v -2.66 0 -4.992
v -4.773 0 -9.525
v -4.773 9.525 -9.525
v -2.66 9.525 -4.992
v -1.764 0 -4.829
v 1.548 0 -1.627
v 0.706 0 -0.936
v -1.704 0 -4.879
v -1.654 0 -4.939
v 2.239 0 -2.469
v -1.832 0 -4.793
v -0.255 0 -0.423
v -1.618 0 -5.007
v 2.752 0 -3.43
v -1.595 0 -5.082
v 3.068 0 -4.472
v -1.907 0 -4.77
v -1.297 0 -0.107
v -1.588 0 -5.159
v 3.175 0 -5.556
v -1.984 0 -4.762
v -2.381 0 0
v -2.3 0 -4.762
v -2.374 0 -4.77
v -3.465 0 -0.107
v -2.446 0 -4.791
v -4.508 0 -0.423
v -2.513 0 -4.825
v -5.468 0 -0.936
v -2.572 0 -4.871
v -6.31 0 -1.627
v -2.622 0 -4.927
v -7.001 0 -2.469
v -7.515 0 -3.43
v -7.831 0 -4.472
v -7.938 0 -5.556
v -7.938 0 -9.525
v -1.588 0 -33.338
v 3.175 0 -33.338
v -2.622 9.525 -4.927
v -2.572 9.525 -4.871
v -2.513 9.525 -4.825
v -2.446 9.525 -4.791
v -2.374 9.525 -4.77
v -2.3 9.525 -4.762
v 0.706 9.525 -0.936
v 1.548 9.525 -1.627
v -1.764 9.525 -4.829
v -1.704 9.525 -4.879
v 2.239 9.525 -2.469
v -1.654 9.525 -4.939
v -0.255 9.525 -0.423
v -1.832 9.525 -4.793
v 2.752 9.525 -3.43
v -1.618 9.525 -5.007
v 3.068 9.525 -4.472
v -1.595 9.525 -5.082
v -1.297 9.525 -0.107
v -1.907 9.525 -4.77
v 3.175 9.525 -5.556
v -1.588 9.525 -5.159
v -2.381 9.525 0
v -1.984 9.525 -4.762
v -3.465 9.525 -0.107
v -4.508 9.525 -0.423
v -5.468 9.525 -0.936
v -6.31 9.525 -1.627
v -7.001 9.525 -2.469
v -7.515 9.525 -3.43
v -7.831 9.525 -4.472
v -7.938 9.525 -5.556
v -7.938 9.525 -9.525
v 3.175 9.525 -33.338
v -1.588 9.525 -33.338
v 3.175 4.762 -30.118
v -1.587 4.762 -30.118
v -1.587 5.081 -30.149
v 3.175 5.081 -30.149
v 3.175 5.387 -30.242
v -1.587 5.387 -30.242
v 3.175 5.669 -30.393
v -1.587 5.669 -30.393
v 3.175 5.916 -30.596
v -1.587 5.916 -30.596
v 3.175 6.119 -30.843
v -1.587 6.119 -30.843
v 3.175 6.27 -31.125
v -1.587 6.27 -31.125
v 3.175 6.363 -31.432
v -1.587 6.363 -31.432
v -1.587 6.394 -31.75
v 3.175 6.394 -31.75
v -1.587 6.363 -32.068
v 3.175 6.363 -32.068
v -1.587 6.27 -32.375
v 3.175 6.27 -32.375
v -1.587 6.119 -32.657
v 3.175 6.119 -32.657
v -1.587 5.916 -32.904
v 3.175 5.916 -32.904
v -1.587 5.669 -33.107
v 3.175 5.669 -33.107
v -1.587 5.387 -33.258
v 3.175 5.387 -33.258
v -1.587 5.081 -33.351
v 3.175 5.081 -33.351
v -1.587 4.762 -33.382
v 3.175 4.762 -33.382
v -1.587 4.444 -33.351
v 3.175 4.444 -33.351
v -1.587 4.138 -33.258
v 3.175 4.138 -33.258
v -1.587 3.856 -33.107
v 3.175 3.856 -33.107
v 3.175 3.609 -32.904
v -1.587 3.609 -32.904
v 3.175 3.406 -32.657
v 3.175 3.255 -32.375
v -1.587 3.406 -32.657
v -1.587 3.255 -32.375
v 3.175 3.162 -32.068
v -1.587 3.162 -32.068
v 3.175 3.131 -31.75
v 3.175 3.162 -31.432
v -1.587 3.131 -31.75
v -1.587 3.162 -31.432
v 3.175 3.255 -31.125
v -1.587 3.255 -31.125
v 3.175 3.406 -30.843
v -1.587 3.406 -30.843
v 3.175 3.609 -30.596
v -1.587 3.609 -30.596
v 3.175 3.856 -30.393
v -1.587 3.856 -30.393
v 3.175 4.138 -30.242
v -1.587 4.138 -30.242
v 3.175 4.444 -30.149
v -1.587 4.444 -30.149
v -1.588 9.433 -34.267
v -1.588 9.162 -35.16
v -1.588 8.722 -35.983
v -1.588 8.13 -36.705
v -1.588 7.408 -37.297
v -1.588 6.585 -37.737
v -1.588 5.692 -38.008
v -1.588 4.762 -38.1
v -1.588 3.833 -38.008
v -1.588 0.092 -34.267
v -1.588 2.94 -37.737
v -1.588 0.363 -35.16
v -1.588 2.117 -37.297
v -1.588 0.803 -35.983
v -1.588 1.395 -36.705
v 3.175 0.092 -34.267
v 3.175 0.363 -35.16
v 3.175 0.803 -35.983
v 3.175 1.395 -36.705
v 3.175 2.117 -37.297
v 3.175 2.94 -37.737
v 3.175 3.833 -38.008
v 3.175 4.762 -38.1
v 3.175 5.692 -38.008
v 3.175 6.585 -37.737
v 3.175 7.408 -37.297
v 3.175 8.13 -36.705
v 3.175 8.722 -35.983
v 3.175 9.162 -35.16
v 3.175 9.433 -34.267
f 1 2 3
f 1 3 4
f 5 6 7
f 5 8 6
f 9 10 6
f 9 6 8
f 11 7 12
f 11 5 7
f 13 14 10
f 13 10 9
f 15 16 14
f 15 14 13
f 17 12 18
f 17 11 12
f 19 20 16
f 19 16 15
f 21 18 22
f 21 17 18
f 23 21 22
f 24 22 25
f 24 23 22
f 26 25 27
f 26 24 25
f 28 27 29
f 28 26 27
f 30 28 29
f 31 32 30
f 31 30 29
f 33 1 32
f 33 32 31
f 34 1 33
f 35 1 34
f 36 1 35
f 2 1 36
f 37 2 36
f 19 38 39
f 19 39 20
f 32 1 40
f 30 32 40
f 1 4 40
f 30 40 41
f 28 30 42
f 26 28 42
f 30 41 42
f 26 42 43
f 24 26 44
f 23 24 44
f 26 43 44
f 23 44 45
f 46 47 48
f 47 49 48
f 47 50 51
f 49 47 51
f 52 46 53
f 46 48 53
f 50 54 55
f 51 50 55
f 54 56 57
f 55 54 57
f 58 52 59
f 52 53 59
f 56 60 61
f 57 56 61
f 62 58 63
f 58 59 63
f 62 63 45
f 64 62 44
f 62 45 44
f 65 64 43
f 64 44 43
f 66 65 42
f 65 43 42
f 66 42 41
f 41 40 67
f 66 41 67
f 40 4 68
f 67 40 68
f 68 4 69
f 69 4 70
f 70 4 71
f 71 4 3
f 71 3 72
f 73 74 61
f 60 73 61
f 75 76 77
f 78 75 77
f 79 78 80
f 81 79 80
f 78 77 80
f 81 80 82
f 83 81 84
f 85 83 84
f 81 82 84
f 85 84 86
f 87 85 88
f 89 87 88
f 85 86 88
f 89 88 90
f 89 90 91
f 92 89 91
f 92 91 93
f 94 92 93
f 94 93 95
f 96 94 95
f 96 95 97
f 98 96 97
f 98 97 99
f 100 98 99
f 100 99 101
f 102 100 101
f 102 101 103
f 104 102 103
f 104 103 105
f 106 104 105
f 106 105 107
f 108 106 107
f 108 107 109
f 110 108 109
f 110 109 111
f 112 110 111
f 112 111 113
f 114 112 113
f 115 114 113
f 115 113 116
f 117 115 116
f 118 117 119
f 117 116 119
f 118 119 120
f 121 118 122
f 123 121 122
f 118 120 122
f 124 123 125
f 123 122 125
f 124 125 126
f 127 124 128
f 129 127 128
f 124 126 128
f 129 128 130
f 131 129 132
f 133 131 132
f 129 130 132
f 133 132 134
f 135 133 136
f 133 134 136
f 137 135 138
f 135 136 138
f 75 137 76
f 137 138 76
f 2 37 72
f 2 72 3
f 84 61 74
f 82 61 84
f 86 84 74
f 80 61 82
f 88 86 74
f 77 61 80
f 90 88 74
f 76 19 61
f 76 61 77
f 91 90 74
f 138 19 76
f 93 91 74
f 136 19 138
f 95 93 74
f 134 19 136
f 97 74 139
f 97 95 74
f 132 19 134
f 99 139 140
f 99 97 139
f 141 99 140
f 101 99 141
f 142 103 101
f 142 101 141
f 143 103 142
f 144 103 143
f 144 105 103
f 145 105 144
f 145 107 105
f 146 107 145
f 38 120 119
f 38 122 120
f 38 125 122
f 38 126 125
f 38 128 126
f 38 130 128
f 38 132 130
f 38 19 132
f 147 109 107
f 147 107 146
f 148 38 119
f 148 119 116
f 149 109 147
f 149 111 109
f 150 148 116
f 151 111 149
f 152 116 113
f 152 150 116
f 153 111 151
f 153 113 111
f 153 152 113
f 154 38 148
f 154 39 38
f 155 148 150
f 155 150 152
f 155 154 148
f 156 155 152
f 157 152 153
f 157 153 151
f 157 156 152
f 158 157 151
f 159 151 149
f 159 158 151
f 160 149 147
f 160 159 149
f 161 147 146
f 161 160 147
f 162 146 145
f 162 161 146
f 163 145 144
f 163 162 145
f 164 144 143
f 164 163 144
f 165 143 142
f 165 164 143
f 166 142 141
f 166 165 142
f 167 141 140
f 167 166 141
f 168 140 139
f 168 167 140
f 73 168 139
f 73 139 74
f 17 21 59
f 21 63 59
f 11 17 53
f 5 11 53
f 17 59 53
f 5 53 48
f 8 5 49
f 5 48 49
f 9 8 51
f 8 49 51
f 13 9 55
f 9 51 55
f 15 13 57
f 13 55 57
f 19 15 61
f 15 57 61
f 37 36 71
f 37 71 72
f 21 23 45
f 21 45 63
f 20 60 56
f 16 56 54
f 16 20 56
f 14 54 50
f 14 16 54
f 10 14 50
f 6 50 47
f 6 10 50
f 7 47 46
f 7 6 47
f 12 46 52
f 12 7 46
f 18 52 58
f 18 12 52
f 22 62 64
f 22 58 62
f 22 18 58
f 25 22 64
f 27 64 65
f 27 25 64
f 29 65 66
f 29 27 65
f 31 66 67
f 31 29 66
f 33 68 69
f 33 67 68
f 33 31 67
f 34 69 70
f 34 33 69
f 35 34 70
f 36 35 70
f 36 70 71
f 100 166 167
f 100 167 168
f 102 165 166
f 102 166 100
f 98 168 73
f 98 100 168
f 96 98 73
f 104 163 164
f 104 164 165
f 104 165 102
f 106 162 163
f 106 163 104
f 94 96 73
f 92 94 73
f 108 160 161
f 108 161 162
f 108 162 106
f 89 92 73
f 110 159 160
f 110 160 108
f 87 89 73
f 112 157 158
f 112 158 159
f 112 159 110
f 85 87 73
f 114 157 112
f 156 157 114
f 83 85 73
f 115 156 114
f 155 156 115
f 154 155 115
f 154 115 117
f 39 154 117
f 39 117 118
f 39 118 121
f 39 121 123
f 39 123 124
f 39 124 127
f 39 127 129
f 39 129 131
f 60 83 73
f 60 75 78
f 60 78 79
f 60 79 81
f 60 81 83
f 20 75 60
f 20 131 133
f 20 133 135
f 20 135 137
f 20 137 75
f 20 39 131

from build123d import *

# Parameters (mm, degrees)
BOSS_EXTRUDE1_DEPTH   = 9.525
FILLET1_R             = 0.396875
FILLET3_RADIUS        = 5.55625
FILLET3_LENGTH        = 9.525
FILLET4_RADIUS        = 4.7625
FILLET4_LENGTH        = 4.7625
F_4_CLEARANCE_HOLE1_D = 3.2639


with BuildPart() as part:
    # Sketch1 → Boss-Extrude1 (new body)
    with BuildSketch(Plane(origin=(0, 0, 0), x_dir=(1, 0, 0), z_dir=(0, 1, 0))):
        Polygon((0, 0), (-7.9375, 0), (-7.9375, 9.525), (-4.773490222, 9.525), (-2.5527, 4.7625), (-1.5875, 4.7625), (-1.5875, 38.1), (3.175, 38.1), (3.175, 0), align=None)
    extrude(amount=BOSS_EXTRUDE1_DEPTH)

    # Fillet1
    fillet1_edges = [part.edges().sort_by_distance(p)[0] for p in [
        (-2.5527, 4.7625, -4.7625),
        (-1.5875, 4.7625, -4.7625),
    ]]
    fillet(fillet1_edges, radius=FILLET1_R)

    # Fillet3: full round fillet: the end face becomes a half cylinder, R = half its width
    fillet3_face = Plane((-2.38125, 4.7625, 0), x_dir=(0, -1, 0), z_dir=(0, 0, 1))  # on the end face: x along it, z out of the body
    fillet3_slab = fillet3_face.offset(-FILLET3_RADIUS / 2) * Box(FILLET3_LENGTH, 2 * FILLET3_RADIUS, FILLET3_RADIUS, mode=Mode.PRIVATE)  # the body's end, R deep
    fillet3_round = Plane((-2.38125, 4.7625, -5.55625), x_dir=(0, 0, 1), z_dir=(0, -1, 0)) * Cylinder(FILLET3_RADIUS, FILLET3_LENGTH, mode=Mode.PRIVATE)  # its axis R under the face
    add(fillet3_slab - fillet3_round, mode=Mode.SUBTRACT)

    # Fillet4: full round fillet: the end face becomes a half cylinder, R = half its width
    fillet4_face = Plane((0.79375, 4.7625, -38.1), x_dir=(1, 0, 0), z_dir=(0, 0, -1))  # on the end face: x along it, z out of the body
    fillet4_slab = fillet4_face.offset(-FILLET4_RADIUS / 2) * Box(FILLET4_LENGTH, 2 * FILLET4_RADIUS, FILLET4_RADIUS, mode=Mode.PRIVATE)  # the body's end, R deep
    fillet4_round = Plane((0.79375, 4.7625, -33.3375), x_dir=(0, 0, -1), z_dir=(1, 0, 0)) * Cylinder(FILLET4_RADIUS, FILLET4_LENGTH, mode=Mode.PRIVATE)  # its axis R under the face
    add(fillet4_slab - fillet4_round, mode=Mode.SUBTRACT)

    # #4 Clearance Hole1 (through all)
    with Locations(Plane(origin=(3.175, 0, 0), x_dir=(0, 0, -1), z_dir=(1, 0, 0))):
        with Locations((31.75, 4.7625)):
            Hole(F_4_CLEARANCE_HOLE1_D / 2)


solid = part.part
